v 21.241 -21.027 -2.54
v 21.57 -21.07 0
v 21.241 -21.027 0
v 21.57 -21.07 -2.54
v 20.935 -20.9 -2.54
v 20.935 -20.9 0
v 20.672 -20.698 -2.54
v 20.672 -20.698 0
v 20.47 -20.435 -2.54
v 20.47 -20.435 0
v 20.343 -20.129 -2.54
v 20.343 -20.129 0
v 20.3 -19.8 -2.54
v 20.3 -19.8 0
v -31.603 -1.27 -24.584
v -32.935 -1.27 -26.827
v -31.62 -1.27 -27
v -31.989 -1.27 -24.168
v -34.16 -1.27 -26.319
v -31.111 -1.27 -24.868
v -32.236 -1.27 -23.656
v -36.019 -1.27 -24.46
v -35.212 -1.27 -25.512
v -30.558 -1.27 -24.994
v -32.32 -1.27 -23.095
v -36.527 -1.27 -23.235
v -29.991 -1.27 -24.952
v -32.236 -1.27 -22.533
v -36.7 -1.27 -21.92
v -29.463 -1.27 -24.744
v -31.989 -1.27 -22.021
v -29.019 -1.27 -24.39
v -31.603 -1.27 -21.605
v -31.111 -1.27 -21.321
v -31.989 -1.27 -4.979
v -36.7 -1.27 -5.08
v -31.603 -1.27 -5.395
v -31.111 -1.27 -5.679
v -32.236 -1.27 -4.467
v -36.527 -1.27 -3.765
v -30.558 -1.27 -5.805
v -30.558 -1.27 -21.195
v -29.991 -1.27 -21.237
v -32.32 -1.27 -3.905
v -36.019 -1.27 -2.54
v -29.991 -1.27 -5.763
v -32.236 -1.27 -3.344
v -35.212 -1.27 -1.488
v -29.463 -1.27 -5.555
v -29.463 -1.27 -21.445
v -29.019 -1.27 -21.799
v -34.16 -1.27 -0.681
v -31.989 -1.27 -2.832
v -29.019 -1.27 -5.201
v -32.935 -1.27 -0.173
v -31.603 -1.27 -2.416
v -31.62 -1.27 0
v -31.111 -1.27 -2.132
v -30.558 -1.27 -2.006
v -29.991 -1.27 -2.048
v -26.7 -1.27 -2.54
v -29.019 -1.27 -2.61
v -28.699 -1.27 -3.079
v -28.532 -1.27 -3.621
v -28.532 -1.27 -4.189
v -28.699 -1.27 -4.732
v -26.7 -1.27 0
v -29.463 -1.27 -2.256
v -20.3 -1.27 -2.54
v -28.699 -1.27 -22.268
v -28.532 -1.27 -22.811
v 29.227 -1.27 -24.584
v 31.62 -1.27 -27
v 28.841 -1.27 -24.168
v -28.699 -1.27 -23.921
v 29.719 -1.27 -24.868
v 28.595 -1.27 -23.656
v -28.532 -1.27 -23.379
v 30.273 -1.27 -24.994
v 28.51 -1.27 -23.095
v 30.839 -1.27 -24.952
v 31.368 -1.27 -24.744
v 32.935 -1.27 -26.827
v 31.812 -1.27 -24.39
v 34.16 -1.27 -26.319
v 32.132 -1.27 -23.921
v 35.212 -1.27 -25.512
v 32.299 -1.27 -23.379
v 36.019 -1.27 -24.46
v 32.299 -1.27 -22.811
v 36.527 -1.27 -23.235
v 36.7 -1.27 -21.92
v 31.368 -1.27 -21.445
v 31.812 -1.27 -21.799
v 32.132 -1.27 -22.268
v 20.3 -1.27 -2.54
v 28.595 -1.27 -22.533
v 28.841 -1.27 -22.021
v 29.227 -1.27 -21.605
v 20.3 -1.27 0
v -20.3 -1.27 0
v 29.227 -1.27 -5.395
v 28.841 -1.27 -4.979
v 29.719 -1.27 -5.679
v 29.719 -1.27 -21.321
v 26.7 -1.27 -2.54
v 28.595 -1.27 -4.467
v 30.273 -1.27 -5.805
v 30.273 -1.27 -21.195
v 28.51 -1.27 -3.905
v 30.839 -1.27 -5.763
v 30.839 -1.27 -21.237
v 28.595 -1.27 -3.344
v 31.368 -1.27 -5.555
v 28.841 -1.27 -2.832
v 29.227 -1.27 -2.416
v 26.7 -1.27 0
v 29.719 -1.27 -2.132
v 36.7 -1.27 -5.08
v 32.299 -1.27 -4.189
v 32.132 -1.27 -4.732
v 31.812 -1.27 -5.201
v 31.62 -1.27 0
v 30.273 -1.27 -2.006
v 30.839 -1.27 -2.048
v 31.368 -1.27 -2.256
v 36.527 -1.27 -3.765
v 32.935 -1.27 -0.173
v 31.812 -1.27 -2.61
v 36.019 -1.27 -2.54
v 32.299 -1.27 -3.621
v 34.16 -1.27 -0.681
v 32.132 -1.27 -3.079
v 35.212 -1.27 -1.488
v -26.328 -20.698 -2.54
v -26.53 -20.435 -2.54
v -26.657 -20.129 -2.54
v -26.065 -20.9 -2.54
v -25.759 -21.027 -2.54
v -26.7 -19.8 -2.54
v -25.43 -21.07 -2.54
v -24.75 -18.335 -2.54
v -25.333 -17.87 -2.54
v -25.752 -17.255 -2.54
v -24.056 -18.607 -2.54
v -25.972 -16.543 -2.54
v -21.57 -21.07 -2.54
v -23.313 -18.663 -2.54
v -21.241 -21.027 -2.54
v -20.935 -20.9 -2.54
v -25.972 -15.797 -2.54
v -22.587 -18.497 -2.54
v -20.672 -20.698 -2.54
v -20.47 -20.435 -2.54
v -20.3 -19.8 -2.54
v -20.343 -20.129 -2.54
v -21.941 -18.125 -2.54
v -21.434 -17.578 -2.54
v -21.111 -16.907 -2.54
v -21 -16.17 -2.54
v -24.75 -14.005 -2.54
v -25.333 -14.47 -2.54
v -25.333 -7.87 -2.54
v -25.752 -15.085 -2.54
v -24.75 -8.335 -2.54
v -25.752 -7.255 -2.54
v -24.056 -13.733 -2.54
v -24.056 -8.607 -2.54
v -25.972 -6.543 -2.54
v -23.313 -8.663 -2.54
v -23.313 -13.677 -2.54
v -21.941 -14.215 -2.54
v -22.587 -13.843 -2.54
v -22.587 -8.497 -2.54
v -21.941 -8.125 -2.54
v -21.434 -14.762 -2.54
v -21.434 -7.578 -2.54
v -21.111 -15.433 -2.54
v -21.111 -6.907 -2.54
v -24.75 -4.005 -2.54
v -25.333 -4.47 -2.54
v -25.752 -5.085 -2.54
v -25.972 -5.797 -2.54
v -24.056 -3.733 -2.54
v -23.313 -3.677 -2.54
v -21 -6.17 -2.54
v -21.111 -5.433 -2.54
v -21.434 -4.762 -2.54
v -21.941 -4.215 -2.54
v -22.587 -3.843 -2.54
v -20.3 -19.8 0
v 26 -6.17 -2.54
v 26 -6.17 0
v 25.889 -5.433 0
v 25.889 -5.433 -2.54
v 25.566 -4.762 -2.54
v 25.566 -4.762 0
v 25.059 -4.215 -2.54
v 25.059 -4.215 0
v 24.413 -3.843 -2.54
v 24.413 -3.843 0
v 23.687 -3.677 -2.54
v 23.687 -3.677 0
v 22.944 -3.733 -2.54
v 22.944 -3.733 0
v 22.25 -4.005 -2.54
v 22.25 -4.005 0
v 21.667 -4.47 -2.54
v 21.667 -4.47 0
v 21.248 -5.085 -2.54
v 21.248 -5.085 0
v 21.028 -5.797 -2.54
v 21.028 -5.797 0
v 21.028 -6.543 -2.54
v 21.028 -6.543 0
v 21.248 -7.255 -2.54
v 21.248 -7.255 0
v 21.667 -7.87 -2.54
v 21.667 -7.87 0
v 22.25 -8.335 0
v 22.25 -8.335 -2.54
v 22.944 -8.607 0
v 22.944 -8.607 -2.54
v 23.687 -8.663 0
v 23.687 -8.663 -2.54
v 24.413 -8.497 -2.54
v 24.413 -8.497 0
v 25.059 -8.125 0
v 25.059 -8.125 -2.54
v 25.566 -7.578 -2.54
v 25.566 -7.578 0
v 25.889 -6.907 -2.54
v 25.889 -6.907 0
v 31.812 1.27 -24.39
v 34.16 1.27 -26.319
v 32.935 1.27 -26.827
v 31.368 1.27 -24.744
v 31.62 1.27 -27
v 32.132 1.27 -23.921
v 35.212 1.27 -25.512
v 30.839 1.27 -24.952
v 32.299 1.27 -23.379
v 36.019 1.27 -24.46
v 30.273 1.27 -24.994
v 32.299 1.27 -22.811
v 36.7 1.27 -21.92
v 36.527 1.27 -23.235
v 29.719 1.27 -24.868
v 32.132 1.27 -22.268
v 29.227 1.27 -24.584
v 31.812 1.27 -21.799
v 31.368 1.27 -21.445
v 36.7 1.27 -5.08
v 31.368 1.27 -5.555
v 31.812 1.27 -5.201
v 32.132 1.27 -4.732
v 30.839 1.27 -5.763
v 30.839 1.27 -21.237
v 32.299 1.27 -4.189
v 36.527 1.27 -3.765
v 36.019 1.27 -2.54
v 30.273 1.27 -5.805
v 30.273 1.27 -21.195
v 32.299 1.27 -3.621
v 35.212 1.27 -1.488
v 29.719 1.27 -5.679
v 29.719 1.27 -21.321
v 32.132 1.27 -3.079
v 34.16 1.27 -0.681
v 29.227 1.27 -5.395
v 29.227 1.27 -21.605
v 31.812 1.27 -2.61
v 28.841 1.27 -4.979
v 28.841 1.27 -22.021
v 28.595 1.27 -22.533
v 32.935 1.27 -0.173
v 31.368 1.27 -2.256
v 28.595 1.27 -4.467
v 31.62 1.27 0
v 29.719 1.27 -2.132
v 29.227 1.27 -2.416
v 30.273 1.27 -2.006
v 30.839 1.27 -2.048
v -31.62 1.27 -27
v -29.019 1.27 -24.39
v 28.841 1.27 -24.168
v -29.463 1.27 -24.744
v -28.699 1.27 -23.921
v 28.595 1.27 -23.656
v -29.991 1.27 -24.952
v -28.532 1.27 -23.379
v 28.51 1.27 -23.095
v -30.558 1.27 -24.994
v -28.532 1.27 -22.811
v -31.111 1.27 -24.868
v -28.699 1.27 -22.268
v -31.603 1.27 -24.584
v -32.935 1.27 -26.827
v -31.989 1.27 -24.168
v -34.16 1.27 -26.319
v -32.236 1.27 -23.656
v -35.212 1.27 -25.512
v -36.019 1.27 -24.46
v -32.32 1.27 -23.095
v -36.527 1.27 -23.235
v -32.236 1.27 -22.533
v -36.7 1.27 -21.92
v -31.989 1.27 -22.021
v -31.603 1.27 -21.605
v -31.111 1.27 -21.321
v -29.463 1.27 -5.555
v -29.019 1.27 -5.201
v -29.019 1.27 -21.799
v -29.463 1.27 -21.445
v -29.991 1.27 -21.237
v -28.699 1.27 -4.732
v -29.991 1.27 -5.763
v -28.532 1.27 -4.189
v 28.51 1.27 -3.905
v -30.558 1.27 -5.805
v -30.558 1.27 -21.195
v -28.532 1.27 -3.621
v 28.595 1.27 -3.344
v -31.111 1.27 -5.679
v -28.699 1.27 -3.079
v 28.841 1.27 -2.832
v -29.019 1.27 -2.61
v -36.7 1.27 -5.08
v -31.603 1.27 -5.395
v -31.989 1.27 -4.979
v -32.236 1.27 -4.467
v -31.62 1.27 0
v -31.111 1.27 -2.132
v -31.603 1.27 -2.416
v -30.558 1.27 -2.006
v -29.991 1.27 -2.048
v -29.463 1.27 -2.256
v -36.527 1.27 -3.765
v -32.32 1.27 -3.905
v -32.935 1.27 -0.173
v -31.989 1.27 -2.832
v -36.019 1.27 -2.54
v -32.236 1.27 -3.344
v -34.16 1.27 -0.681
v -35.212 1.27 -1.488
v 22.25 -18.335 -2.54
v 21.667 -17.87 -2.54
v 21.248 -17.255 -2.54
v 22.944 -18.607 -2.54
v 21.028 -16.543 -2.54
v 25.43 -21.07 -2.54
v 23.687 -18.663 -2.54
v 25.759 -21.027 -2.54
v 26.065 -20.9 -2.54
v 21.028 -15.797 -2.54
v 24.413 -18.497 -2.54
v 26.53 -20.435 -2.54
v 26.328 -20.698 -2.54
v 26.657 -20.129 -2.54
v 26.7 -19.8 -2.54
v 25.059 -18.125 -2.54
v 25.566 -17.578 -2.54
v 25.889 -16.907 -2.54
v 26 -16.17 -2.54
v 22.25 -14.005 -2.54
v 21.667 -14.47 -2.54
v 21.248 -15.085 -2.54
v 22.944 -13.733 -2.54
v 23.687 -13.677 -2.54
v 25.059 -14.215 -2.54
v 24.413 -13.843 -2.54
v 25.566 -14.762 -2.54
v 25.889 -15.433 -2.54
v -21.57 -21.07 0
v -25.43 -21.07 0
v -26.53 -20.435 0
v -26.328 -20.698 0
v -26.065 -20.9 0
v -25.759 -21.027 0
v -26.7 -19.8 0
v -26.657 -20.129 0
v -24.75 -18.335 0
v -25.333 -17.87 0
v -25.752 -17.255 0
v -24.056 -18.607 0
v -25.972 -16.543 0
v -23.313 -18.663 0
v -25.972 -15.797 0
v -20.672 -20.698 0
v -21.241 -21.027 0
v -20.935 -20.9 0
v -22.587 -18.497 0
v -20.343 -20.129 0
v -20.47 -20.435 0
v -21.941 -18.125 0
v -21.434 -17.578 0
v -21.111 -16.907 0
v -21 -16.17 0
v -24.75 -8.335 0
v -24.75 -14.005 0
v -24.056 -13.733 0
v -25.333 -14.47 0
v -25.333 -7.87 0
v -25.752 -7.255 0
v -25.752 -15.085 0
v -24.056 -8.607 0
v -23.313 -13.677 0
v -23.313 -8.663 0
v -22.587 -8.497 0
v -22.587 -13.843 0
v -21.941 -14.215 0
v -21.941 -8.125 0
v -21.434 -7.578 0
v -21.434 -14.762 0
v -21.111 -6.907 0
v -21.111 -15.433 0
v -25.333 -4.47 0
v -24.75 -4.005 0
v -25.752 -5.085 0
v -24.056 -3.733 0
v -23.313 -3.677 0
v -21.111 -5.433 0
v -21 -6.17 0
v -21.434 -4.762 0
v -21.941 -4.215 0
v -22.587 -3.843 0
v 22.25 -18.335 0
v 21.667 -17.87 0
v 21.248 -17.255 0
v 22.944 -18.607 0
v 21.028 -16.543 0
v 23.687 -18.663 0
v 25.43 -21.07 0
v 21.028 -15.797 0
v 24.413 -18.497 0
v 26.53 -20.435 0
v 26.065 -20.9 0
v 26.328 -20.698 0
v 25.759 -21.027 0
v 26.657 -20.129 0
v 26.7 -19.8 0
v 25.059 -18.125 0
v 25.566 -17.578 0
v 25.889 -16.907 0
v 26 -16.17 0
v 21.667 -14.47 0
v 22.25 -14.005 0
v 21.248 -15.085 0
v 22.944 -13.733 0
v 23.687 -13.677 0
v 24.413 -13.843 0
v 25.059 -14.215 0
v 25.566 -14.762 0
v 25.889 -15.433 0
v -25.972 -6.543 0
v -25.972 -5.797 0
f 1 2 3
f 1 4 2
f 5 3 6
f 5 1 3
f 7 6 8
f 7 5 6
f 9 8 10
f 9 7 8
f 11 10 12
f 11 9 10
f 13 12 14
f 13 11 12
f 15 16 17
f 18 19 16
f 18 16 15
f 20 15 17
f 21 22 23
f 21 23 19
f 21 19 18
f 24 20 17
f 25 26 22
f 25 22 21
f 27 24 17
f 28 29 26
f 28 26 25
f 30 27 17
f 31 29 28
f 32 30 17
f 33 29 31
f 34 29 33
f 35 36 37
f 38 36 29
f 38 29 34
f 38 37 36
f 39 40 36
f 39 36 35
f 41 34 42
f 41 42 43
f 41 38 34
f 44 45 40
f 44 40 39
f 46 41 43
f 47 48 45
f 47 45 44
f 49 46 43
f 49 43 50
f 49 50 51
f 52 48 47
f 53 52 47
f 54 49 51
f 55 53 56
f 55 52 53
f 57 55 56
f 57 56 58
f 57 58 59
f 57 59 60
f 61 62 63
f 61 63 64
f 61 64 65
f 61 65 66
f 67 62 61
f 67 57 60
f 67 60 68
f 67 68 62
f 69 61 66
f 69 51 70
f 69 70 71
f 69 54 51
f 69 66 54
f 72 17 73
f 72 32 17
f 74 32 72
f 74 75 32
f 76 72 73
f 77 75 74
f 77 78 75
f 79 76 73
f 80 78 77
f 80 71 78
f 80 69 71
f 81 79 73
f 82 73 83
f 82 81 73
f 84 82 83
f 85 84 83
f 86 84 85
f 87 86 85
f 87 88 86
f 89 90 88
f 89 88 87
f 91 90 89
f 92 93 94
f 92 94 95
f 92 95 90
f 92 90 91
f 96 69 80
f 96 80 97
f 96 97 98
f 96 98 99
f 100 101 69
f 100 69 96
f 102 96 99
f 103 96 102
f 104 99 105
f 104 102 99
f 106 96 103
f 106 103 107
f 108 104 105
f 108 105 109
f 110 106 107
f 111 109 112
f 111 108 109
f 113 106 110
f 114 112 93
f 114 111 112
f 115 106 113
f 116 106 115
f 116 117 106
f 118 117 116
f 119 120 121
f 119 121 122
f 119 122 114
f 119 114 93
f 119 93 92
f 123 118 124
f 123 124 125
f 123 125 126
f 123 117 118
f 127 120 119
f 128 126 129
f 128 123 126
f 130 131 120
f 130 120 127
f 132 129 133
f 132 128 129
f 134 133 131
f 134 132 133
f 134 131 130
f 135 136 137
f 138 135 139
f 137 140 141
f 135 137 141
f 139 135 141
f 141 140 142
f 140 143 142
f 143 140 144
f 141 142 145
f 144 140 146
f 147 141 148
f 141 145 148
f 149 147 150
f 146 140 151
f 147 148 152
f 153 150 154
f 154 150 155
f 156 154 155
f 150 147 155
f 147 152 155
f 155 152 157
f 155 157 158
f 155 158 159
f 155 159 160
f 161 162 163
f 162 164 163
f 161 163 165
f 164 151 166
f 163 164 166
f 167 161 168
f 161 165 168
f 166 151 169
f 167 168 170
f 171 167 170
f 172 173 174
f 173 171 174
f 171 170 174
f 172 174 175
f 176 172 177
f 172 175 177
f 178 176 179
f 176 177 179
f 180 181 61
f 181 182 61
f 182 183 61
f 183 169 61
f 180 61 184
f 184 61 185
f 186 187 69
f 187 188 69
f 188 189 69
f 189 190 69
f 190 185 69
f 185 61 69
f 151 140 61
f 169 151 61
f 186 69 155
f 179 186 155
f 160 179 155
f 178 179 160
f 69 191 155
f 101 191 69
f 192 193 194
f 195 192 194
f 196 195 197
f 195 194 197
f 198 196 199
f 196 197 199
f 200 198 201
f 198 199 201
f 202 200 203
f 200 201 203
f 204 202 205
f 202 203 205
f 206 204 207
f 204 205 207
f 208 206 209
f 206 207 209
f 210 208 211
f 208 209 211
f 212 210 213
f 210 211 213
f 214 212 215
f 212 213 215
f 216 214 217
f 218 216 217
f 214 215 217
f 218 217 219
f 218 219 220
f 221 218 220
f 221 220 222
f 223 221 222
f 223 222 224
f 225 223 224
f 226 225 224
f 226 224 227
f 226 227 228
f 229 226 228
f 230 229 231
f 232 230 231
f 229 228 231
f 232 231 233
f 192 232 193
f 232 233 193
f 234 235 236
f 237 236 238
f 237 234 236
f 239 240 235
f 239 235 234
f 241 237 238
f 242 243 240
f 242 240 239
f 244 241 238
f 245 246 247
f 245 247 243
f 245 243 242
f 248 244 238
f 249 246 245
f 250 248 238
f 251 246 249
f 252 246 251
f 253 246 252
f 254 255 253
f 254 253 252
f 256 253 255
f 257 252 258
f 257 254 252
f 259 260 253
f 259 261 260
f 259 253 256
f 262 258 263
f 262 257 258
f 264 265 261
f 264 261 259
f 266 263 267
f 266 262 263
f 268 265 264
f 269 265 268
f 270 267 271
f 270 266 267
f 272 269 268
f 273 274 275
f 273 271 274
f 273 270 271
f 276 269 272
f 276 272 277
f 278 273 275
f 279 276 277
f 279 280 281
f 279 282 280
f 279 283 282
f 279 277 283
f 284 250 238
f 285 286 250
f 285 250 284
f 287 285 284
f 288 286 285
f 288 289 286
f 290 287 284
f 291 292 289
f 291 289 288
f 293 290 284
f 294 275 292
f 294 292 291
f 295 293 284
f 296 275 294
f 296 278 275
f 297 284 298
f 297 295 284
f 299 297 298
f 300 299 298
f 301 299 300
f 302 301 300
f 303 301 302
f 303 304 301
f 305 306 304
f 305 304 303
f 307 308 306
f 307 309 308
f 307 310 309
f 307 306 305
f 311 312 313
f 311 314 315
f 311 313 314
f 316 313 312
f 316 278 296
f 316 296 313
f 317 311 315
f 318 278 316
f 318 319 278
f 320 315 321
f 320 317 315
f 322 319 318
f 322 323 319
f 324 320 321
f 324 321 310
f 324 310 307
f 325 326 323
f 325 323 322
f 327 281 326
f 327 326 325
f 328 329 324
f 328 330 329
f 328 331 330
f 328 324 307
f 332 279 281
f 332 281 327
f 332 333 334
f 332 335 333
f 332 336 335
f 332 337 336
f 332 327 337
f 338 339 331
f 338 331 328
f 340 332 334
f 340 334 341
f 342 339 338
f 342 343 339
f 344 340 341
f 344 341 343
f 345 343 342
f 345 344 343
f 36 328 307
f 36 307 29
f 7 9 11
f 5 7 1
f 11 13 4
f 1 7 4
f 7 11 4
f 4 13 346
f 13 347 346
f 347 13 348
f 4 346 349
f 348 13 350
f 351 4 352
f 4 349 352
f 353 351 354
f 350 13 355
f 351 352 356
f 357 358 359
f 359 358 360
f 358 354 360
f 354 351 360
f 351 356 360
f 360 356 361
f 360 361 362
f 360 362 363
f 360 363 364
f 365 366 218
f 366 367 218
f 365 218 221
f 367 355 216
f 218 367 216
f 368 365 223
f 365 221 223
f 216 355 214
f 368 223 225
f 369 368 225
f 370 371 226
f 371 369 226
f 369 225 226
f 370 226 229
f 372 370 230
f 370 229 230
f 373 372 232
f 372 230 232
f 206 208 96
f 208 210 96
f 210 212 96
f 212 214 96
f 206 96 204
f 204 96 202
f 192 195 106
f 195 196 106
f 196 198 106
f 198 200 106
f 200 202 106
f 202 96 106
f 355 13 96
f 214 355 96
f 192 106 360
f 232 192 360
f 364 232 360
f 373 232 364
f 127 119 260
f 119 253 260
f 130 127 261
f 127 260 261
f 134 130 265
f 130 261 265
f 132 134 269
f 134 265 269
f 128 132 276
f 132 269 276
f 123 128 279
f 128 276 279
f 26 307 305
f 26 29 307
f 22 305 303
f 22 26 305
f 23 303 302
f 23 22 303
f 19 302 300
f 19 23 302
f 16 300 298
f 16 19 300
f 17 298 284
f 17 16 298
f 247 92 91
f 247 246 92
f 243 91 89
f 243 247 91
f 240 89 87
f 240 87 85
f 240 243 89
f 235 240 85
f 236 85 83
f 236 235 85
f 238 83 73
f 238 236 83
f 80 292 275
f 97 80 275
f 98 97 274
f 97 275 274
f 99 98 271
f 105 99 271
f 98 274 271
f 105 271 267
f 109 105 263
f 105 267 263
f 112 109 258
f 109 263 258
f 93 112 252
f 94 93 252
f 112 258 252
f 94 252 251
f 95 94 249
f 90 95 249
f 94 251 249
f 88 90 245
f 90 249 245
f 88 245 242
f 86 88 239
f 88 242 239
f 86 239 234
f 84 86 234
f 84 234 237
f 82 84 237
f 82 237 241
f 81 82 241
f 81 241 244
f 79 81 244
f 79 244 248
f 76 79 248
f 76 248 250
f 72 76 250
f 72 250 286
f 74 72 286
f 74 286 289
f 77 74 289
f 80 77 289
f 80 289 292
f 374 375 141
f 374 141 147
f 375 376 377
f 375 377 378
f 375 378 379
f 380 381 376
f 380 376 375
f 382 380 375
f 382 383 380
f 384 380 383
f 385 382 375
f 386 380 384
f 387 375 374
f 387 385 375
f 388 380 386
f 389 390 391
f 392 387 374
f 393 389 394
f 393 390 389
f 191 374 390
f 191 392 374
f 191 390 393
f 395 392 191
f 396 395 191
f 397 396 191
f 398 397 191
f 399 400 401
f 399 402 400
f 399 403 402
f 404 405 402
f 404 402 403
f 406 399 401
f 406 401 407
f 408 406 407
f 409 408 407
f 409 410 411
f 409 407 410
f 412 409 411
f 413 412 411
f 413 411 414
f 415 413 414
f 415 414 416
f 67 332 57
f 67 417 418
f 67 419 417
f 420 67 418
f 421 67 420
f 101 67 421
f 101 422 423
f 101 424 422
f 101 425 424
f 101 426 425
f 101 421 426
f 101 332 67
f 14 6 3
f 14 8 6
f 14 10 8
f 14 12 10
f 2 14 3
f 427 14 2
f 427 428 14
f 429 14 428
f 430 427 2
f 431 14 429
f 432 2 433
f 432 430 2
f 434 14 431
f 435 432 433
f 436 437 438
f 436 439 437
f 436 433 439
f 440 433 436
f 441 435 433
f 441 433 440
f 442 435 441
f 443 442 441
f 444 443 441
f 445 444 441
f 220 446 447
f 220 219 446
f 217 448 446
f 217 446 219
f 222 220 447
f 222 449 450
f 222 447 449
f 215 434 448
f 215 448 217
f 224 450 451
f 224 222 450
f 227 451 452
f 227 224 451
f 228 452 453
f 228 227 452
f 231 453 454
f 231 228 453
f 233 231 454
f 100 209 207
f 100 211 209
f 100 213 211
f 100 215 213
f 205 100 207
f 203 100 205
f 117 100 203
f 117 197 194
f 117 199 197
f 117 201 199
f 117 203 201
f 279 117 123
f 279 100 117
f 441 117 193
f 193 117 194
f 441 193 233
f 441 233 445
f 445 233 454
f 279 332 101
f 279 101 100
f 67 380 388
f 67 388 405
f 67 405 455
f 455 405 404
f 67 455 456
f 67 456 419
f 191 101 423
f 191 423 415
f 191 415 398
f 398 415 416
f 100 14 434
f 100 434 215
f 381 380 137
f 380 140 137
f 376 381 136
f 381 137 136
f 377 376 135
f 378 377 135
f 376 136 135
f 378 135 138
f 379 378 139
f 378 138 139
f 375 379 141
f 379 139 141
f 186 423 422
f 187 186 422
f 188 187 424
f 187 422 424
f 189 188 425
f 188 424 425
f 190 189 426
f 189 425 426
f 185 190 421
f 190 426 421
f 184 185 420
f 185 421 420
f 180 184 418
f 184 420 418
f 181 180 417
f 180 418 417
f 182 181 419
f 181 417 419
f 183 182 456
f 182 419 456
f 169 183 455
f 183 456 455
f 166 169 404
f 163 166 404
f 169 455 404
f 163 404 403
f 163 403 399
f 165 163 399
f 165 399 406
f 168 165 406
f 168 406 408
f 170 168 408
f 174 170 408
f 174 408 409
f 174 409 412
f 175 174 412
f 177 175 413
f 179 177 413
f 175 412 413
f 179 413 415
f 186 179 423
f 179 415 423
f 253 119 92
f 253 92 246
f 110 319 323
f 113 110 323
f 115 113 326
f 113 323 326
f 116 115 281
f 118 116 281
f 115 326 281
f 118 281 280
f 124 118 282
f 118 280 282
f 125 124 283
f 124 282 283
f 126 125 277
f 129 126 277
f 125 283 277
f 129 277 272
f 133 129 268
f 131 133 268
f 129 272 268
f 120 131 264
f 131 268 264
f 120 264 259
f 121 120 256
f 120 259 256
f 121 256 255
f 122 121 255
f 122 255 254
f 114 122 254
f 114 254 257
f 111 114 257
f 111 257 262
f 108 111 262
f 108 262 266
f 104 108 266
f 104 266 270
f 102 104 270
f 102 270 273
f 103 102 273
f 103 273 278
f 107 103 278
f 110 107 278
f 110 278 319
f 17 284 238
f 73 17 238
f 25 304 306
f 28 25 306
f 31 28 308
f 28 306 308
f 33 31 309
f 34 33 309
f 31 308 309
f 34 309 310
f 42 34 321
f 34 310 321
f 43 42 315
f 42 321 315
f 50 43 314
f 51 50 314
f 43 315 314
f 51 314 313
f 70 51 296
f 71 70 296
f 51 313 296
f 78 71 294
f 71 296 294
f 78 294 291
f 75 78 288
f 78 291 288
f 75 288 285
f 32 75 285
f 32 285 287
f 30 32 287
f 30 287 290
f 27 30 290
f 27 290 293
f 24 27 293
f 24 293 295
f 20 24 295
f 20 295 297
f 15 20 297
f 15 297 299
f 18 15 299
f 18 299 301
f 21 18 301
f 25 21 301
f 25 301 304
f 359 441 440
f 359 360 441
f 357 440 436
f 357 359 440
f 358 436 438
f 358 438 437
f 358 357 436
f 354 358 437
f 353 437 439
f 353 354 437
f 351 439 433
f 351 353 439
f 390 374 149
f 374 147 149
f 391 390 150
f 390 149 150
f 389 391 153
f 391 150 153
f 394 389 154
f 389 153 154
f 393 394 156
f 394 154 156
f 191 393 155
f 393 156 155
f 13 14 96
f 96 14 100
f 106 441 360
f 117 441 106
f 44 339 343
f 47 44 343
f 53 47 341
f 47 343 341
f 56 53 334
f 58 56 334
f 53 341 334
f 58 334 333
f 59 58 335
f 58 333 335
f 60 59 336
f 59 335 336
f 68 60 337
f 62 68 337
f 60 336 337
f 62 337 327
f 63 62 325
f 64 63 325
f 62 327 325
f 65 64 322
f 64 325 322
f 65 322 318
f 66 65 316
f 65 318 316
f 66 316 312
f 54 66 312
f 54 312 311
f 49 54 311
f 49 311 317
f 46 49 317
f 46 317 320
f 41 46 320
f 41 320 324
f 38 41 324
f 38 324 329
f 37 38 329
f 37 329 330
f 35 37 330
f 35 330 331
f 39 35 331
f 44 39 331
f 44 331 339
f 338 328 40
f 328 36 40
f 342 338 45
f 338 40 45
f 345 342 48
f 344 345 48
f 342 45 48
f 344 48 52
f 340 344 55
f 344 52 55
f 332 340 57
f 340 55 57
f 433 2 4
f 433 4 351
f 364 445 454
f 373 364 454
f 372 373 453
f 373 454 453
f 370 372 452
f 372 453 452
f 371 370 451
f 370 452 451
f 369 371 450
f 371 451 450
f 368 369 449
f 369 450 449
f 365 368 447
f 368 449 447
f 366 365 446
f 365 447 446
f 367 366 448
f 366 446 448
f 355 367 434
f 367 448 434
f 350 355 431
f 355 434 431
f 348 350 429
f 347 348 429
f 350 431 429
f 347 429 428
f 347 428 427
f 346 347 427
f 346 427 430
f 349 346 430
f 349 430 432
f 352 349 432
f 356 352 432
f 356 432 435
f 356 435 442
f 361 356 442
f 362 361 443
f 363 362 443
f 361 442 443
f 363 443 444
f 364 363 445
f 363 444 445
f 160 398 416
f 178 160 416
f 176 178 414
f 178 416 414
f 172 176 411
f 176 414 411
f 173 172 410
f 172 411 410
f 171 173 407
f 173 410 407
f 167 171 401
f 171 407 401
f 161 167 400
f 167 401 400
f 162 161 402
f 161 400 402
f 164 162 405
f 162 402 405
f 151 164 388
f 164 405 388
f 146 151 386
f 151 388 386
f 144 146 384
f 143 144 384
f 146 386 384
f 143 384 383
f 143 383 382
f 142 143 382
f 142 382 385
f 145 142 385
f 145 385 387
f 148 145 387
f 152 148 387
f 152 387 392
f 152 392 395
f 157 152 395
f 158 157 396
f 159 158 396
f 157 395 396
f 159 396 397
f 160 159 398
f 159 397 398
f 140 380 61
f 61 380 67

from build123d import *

# Parameters (mm, degrees)
F1_DEPTH = 27
F0_W     = 6.4
F0_H     = 19.8
F0_R     = 2.5
F2_DEPTH = 2.54
F3_R     = 5.08
F5_D     = 3.81
F6_R     = 1.27


with BuildPart() as f1:
    # F0 (on Top) → F1 (new body)
    with BuildSketch(Plane.XY):
        Polygon((36.7, 1.27), (26.7, 1.27), (-26.7, 1.27), (-36.7, 1.27), (-36.7, -1.27), (-26.7, -1.27), (-20.3, -1.27), (20.3, -1.27), (26.7, -1.27), (36.7, -1.27), align=None)
    extrude(amount=-F1_DEPTH)

    # F0 (on Top) → F2 (join)
    with BuildSketch(Plane.XY):
        with Locations((-23.5, -11.17)):
            Rectangle(F0_W, F0_H)
        with Locations((-23.5, -16.17)):
            Circle(F0_R, mode=Mode.SUBTRACT)
        with Locations((-23.5, -6.17)):
            Circle(F0_R, mode=Mode.SUBTRACT)
        with Locations((23.5, -11.17)):
            Rectangle(F0_W, F0_H)
        with Locations((23.5, -16.17)):
            Circle(F0_R, mode=Mode.SUBTRACT)
        with Locations((23.5, -6.17)):
            Circle(F0_R, mode=Mode.SUBTRACT)
    extrude(amount=-F2_DEPTH)

    # F3
    f3_edges = [f1.edges().sort_by_distance(p)[0] for p in [
        (-36.7, 0, 0),
        (36.7, 0, 0),
        (36.7, 0, -27),
        (-36.7, 0, -27),
    ]]
    fillet(f3_edges, radius=F3_R)

    # F5 (through all)
    with Locations(Plane.XZ.offset(1.27)):
        with Locations((-30.41523, -3.90541), (-30.41523, -23.09459), (30.41523, -3.90541), (30.41523, -23.09459)):
            Hole(F5_D / 2)

    # F6
    f6_edges = [f1.edges().sort_by_distance(p)[0] for p in [
        (-20.3, -21.07, -1.27),
        (-26.7, -21.07, -1.27),
        (20.3, -21.07, -1.27),
        (26.7, -21.07, -1.27),
    ]]
    fillet(f6_edges, radius=F6_R)


solid = f1.part
